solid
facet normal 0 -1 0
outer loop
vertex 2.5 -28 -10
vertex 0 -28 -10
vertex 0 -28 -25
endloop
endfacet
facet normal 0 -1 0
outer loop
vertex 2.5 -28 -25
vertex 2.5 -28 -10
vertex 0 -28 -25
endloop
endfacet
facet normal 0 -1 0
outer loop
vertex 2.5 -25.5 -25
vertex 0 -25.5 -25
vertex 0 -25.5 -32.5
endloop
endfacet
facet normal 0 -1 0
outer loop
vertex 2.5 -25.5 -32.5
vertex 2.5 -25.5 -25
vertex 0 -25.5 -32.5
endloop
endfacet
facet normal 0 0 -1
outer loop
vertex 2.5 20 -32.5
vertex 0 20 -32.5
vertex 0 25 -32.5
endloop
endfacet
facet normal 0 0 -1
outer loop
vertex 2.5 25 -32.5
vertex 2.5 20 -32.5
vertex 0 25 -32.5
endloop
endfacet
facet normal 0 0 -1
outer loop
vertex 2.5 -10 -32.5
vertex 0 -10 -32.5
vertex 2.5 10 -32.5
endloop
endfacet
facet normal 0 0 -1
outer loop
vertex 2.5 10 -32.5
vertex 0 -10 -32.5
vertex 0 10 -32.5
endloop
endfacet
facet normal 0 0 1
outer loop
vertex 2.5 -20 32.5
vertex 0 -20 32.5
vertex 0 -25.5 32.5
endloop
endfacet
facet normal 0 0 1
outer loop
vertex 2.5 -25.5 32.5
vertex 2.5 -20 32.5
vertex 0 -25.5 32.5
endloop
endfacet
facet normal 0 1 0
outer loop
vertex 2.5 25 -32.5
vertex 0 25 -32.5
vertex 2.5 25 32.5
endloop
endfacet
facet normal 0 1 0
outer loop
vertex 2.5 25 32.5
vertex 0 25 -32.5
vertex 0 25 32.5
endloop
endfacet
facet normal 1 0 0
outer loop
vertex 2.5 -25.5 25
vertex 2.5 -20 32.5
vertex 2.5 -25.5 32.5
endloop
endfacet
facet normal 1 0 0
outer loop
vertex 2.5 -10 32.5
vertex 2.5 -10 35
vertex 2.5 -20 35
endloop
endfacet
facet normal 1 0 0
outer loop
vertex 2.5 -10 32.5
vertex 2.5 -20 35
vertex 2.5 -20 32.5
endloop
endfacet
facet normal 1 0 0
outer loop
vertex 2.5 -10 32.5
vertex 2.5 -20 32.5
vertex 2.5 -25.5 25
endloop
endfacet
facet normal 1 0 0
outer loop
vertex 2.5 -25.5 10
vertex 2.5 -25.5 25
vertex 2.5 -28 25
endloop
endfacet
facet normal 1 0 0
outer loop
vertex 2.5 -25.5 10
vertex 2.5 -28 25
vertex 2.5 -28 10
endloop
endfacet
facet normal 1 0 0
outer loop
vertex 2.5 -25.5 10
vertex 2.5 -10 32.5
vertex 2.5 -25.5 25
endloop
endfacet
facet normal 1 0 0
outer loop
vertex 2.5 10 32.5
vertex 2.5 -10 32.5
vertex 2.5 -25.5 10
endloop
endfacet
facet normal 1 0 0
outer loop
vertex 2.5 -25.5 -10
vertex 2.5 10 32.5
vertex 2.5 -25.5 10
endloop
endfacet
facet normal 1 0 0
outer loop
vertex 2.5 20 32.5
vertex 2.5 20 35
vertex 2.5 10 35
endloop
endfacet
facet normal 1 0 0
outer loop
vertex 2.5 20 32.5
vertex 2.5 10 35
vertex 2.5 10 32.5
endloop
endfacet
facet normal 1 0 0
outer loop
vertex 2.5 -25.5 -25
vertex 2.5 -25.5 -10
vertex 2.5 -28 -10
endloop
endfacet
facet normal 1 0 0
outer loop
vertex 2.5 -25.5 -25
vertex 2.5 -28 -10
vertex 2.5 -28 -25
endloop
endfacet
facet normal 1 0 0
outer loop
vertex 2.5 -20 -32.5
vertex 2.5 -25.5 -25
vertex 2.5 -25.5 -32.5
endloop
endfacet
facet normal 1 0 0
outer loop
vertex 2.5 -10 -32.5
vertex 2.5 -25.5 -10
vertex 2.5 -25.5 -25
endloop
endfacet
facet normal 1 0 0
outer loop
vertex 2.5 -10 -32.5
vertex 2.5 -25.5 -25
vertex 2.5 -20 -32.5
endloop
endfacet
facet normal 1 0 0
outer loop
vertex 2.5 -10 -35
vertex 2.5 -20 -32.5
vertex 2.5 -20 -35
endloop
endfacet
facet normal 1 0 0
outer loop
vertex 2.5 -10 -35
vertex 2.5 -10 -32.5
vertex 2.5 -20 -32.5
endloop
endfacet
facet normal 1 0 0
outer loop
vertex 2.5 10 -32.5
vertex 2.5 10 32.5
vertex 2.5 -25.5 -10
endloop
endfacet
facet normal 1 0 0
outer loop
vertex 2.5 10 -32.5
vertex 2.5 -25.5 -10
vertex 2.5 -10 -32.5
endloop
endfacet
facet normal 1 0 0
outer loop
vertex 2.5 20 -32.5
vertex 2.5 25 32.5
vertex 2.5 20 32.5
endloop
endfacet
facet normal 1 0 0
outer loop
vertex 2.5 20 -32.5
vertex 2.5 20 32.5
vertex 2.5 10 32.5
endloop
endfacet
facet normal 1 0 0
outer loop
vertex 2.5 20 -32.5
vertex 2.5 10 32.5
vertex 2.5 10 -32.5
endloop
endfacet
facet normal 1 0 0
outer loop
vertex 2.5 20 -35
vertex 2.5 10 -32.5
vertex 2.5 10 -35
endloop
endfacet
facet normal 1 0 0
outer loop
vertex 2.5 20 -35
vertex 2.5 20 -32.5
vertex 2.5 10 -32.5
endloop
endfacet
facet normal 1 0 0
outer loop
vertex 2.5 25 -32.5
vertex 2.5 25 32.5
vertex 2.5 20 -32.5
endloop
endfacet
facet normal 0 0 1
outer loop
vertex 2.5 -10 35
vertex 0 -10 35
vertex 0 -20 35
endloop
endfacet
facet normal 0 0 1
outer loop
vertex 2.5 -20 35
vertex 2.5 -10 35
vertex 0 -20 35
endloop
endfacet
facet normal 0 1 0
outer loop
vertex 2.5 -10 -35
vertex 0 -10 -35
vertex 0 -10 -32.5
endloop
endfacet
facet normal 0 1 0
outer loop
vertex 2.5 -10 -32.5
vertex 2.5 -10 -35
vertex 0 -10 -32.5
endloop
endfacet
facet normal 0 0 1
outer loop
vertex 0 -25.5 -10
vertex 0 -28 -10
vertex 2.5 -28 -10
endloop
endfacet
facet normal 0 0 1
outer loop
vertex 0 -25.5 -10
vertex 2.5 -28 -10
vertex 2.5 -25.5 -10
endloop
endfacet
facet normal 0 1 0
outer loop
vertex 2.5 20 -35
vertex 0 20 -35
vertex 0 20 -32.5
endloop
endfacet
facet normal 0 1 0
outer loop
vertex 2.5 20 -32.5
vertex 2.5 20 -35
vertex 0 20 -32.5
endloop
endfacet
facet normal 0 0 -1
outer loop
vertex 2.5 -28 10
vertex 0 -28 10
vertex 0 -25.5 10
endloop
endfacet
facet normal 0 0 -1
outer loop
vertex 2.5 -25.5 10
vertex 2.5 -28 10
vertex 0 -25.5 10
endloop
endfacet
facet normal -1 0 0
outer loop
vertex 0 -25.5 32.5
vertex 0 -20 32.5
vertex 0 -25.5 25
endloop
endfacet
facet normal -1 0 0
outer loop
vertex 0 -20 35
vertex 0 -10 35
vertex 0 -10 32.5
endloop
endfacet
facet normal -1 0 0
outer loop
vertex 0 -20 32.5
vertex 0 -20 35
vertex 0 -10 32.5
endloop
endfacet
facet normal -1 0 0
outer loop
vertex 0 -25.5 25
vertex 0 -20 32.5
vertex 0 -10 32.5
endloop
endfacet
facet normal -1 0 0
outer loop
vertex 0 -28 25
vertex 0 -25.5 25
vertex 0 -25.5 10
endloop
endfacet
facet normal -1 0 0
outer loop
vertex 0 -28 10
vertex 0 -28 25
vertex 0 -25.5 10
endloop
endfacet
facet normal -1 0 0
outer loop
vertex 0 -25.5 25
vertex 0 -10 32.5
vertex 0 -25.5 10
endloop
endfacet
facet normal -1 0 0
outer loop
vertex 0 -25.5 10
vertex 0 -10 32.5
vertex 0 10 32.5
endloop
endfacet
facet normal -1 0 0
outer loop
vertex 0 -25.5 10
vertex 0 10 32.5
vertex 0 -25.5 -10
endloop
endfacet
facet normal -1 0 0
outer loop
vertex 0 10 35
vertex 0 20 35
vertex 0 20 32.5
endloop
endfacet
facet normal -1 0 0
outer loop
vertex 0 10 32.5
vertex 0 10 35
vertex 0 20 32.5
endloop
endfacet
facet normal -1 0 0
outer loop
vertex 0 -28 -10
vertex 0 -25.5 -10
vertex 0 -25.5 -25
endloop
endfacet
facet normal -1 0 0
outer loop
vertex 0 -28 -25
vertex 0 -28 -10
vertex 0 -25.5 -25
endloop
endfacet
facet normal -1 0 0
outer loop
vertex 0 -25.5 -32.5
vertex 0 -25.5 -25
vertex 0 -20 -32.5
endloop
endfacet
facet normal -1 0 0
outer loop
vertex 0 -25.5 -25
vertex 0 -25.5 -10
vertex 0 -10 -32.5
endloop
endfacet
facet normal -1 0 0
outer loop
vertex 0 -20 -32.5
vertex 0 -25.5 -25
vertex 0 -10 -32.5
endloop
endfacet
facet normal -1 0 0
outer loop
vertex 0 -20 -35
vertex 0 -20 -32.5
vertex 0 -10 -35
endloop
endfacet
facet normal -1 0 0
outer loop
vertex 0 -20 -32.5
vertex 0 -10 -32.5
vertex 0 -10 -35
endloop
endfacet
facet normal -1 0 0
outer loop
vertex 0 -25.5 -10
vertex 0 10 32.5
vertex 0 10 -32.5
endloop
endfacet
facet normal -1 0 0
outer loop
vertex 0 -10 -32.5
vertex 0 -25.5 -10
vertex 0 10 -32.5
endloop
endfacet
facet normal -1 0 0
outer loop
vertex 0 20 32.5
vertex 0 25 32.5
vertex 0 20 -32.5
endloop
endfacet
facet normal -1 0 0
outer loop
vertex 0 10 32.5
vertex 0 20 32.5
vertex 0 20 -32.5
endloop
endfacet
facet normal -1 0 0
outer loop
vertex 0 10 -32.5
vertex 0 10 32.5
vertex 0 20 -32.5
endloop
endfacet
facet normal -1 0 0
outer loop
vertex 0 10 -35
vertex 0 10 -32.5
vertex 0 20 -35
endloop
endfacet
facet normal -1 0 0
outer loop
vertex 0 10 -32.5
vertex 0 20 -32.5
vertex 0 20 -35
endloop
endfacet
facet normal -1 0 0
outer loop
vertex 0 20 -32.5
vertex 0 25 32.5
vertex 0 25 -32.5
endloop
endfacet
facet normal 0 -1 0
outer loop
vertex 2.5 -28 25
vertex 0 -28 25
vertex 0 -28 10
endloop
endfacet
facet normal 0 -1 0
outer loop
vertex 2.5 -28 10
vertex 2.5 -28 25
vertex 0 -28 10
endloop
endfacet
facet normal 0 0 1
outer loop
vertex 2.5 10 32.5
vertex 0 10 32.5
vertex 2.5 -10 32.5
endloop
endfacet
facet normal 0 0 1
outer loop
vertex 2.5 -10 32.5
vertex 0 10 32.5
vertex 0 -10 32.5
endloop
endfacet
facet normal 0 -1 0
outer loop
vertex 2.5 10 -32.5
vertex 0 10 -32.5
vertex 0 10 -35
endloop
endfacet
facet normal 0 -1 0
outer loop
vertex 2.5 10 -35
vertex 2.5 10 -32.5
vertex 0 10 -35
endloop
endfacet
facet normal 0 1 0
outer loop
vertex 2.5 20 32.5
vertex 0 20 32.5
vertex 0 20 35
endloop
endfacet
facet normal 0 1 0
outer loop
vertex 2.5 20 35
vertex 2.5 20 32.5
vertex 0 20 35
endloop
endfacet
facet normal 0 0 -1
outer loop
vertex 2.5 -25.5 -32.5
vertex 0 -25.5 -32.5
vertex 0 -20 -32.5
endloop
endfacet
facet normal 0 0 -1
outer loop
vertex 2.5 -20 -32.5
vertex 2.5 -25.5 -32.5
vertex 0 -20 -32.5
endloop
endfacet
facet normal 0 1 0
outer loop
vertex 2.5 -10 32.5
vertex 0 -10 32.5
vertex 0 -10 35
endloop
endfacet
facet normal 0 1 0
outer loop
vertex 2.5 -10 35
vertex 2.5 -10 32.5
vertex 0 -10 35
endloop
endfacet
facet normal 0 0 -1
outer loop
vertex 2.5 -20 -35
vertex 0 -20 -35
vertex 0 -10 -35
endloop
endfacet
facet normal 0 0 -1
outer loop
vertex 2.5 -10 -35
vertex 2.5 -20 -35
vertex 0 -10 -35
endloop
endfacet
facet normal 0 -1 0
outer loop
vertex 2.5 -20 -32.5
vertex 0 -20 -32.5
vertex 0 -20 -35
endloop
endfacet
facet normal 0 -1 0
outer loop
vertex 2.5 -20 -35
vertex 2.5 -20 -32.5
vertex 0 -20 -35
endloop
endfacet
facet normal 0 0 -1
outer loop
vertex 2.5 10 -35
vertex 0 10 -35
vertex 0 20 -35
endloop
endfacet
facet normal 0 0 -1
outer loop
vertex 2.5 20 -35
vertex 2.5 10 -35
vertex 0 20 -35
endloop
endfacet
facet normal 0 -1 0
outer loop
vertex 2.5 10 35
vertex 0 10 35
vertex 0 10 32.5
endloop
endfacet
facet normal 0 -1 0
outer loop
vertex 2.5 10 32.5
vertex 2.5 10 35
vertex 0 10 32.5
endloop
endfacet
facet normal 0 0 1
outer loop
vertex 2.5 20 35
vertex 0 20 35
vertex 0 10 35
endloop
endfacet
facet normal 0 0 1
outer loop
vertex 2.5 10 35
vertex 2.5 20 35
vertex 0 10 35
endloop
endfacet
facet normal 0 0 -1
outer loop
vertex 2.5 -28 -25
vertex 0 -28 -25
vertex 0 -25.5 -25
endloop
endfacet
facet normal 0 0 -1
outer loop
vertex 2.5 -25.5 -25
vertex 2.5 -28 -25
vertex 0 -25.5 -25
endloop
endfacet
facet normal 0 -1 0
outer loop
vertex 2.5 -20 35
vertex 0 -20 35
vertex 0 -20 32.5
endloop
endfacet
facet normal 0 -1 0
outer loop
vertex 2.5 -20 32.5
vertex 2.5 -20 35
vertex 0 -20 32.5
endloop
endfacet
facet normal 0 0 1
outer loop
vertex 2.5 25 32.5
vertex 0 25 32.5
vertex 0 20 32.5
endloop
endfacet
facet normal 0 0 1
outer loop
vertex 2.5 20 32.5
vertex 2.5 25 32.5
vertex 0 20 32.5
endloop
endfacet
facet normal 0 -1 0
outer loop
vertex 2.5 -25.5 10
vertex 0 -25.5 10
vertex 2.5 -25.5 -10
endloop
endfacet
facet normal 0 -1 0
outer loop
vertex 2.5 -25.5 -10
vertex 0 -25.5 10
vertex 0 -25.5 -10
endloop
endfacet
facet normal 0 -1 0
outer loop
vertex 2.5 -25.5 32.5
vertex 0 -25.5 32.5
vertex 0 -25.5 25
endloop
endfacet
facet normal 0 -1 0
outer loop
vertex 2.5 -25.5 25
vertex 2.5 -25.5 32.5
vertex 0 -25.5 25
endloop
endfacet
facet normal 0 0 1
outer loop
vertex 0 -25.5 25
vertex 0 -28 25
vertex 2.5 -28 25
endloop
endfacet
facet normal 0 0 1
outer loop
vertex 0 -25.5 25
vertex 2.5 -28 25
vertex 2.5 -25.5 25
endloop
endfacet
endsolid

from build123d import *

# Parameters (mm, degrees)
BOSS_EXTRUDE3_DEPTH = 2.5


with BuildPart() as part:
    # Sketch1<5> → Boss-Extrude3 (new body)
    with BuildSketch(Plane(origin=(0, 0, 0), x_dir=(0, 0, -1), z_dir=(1, 0, 0))):
        Polygon((-32.5, -25.5), (-25, -25.5), (-25, -28), (-10, -28), (-10, -25.5), (10, -25.5), (10, -28), (25, -28), (25, -25.5), (32.5, -25.5), (32.5, -20), (35, -20), (35, -10), (32.5, -10), (32.5, 10), (35, 10), (35, 20), (32.5, 20), (32.5, 25), (-32.5, 25), (-32.5, 20), (-35, 20), (-35, 10), (-32.5, 10), (-32.5, -10), (-35, -10), (-35, -20), (-32.5, -20), align=None)
    extrude(amount=BOSS_EXTRUDE3_DEPTH)


solid = part.part
